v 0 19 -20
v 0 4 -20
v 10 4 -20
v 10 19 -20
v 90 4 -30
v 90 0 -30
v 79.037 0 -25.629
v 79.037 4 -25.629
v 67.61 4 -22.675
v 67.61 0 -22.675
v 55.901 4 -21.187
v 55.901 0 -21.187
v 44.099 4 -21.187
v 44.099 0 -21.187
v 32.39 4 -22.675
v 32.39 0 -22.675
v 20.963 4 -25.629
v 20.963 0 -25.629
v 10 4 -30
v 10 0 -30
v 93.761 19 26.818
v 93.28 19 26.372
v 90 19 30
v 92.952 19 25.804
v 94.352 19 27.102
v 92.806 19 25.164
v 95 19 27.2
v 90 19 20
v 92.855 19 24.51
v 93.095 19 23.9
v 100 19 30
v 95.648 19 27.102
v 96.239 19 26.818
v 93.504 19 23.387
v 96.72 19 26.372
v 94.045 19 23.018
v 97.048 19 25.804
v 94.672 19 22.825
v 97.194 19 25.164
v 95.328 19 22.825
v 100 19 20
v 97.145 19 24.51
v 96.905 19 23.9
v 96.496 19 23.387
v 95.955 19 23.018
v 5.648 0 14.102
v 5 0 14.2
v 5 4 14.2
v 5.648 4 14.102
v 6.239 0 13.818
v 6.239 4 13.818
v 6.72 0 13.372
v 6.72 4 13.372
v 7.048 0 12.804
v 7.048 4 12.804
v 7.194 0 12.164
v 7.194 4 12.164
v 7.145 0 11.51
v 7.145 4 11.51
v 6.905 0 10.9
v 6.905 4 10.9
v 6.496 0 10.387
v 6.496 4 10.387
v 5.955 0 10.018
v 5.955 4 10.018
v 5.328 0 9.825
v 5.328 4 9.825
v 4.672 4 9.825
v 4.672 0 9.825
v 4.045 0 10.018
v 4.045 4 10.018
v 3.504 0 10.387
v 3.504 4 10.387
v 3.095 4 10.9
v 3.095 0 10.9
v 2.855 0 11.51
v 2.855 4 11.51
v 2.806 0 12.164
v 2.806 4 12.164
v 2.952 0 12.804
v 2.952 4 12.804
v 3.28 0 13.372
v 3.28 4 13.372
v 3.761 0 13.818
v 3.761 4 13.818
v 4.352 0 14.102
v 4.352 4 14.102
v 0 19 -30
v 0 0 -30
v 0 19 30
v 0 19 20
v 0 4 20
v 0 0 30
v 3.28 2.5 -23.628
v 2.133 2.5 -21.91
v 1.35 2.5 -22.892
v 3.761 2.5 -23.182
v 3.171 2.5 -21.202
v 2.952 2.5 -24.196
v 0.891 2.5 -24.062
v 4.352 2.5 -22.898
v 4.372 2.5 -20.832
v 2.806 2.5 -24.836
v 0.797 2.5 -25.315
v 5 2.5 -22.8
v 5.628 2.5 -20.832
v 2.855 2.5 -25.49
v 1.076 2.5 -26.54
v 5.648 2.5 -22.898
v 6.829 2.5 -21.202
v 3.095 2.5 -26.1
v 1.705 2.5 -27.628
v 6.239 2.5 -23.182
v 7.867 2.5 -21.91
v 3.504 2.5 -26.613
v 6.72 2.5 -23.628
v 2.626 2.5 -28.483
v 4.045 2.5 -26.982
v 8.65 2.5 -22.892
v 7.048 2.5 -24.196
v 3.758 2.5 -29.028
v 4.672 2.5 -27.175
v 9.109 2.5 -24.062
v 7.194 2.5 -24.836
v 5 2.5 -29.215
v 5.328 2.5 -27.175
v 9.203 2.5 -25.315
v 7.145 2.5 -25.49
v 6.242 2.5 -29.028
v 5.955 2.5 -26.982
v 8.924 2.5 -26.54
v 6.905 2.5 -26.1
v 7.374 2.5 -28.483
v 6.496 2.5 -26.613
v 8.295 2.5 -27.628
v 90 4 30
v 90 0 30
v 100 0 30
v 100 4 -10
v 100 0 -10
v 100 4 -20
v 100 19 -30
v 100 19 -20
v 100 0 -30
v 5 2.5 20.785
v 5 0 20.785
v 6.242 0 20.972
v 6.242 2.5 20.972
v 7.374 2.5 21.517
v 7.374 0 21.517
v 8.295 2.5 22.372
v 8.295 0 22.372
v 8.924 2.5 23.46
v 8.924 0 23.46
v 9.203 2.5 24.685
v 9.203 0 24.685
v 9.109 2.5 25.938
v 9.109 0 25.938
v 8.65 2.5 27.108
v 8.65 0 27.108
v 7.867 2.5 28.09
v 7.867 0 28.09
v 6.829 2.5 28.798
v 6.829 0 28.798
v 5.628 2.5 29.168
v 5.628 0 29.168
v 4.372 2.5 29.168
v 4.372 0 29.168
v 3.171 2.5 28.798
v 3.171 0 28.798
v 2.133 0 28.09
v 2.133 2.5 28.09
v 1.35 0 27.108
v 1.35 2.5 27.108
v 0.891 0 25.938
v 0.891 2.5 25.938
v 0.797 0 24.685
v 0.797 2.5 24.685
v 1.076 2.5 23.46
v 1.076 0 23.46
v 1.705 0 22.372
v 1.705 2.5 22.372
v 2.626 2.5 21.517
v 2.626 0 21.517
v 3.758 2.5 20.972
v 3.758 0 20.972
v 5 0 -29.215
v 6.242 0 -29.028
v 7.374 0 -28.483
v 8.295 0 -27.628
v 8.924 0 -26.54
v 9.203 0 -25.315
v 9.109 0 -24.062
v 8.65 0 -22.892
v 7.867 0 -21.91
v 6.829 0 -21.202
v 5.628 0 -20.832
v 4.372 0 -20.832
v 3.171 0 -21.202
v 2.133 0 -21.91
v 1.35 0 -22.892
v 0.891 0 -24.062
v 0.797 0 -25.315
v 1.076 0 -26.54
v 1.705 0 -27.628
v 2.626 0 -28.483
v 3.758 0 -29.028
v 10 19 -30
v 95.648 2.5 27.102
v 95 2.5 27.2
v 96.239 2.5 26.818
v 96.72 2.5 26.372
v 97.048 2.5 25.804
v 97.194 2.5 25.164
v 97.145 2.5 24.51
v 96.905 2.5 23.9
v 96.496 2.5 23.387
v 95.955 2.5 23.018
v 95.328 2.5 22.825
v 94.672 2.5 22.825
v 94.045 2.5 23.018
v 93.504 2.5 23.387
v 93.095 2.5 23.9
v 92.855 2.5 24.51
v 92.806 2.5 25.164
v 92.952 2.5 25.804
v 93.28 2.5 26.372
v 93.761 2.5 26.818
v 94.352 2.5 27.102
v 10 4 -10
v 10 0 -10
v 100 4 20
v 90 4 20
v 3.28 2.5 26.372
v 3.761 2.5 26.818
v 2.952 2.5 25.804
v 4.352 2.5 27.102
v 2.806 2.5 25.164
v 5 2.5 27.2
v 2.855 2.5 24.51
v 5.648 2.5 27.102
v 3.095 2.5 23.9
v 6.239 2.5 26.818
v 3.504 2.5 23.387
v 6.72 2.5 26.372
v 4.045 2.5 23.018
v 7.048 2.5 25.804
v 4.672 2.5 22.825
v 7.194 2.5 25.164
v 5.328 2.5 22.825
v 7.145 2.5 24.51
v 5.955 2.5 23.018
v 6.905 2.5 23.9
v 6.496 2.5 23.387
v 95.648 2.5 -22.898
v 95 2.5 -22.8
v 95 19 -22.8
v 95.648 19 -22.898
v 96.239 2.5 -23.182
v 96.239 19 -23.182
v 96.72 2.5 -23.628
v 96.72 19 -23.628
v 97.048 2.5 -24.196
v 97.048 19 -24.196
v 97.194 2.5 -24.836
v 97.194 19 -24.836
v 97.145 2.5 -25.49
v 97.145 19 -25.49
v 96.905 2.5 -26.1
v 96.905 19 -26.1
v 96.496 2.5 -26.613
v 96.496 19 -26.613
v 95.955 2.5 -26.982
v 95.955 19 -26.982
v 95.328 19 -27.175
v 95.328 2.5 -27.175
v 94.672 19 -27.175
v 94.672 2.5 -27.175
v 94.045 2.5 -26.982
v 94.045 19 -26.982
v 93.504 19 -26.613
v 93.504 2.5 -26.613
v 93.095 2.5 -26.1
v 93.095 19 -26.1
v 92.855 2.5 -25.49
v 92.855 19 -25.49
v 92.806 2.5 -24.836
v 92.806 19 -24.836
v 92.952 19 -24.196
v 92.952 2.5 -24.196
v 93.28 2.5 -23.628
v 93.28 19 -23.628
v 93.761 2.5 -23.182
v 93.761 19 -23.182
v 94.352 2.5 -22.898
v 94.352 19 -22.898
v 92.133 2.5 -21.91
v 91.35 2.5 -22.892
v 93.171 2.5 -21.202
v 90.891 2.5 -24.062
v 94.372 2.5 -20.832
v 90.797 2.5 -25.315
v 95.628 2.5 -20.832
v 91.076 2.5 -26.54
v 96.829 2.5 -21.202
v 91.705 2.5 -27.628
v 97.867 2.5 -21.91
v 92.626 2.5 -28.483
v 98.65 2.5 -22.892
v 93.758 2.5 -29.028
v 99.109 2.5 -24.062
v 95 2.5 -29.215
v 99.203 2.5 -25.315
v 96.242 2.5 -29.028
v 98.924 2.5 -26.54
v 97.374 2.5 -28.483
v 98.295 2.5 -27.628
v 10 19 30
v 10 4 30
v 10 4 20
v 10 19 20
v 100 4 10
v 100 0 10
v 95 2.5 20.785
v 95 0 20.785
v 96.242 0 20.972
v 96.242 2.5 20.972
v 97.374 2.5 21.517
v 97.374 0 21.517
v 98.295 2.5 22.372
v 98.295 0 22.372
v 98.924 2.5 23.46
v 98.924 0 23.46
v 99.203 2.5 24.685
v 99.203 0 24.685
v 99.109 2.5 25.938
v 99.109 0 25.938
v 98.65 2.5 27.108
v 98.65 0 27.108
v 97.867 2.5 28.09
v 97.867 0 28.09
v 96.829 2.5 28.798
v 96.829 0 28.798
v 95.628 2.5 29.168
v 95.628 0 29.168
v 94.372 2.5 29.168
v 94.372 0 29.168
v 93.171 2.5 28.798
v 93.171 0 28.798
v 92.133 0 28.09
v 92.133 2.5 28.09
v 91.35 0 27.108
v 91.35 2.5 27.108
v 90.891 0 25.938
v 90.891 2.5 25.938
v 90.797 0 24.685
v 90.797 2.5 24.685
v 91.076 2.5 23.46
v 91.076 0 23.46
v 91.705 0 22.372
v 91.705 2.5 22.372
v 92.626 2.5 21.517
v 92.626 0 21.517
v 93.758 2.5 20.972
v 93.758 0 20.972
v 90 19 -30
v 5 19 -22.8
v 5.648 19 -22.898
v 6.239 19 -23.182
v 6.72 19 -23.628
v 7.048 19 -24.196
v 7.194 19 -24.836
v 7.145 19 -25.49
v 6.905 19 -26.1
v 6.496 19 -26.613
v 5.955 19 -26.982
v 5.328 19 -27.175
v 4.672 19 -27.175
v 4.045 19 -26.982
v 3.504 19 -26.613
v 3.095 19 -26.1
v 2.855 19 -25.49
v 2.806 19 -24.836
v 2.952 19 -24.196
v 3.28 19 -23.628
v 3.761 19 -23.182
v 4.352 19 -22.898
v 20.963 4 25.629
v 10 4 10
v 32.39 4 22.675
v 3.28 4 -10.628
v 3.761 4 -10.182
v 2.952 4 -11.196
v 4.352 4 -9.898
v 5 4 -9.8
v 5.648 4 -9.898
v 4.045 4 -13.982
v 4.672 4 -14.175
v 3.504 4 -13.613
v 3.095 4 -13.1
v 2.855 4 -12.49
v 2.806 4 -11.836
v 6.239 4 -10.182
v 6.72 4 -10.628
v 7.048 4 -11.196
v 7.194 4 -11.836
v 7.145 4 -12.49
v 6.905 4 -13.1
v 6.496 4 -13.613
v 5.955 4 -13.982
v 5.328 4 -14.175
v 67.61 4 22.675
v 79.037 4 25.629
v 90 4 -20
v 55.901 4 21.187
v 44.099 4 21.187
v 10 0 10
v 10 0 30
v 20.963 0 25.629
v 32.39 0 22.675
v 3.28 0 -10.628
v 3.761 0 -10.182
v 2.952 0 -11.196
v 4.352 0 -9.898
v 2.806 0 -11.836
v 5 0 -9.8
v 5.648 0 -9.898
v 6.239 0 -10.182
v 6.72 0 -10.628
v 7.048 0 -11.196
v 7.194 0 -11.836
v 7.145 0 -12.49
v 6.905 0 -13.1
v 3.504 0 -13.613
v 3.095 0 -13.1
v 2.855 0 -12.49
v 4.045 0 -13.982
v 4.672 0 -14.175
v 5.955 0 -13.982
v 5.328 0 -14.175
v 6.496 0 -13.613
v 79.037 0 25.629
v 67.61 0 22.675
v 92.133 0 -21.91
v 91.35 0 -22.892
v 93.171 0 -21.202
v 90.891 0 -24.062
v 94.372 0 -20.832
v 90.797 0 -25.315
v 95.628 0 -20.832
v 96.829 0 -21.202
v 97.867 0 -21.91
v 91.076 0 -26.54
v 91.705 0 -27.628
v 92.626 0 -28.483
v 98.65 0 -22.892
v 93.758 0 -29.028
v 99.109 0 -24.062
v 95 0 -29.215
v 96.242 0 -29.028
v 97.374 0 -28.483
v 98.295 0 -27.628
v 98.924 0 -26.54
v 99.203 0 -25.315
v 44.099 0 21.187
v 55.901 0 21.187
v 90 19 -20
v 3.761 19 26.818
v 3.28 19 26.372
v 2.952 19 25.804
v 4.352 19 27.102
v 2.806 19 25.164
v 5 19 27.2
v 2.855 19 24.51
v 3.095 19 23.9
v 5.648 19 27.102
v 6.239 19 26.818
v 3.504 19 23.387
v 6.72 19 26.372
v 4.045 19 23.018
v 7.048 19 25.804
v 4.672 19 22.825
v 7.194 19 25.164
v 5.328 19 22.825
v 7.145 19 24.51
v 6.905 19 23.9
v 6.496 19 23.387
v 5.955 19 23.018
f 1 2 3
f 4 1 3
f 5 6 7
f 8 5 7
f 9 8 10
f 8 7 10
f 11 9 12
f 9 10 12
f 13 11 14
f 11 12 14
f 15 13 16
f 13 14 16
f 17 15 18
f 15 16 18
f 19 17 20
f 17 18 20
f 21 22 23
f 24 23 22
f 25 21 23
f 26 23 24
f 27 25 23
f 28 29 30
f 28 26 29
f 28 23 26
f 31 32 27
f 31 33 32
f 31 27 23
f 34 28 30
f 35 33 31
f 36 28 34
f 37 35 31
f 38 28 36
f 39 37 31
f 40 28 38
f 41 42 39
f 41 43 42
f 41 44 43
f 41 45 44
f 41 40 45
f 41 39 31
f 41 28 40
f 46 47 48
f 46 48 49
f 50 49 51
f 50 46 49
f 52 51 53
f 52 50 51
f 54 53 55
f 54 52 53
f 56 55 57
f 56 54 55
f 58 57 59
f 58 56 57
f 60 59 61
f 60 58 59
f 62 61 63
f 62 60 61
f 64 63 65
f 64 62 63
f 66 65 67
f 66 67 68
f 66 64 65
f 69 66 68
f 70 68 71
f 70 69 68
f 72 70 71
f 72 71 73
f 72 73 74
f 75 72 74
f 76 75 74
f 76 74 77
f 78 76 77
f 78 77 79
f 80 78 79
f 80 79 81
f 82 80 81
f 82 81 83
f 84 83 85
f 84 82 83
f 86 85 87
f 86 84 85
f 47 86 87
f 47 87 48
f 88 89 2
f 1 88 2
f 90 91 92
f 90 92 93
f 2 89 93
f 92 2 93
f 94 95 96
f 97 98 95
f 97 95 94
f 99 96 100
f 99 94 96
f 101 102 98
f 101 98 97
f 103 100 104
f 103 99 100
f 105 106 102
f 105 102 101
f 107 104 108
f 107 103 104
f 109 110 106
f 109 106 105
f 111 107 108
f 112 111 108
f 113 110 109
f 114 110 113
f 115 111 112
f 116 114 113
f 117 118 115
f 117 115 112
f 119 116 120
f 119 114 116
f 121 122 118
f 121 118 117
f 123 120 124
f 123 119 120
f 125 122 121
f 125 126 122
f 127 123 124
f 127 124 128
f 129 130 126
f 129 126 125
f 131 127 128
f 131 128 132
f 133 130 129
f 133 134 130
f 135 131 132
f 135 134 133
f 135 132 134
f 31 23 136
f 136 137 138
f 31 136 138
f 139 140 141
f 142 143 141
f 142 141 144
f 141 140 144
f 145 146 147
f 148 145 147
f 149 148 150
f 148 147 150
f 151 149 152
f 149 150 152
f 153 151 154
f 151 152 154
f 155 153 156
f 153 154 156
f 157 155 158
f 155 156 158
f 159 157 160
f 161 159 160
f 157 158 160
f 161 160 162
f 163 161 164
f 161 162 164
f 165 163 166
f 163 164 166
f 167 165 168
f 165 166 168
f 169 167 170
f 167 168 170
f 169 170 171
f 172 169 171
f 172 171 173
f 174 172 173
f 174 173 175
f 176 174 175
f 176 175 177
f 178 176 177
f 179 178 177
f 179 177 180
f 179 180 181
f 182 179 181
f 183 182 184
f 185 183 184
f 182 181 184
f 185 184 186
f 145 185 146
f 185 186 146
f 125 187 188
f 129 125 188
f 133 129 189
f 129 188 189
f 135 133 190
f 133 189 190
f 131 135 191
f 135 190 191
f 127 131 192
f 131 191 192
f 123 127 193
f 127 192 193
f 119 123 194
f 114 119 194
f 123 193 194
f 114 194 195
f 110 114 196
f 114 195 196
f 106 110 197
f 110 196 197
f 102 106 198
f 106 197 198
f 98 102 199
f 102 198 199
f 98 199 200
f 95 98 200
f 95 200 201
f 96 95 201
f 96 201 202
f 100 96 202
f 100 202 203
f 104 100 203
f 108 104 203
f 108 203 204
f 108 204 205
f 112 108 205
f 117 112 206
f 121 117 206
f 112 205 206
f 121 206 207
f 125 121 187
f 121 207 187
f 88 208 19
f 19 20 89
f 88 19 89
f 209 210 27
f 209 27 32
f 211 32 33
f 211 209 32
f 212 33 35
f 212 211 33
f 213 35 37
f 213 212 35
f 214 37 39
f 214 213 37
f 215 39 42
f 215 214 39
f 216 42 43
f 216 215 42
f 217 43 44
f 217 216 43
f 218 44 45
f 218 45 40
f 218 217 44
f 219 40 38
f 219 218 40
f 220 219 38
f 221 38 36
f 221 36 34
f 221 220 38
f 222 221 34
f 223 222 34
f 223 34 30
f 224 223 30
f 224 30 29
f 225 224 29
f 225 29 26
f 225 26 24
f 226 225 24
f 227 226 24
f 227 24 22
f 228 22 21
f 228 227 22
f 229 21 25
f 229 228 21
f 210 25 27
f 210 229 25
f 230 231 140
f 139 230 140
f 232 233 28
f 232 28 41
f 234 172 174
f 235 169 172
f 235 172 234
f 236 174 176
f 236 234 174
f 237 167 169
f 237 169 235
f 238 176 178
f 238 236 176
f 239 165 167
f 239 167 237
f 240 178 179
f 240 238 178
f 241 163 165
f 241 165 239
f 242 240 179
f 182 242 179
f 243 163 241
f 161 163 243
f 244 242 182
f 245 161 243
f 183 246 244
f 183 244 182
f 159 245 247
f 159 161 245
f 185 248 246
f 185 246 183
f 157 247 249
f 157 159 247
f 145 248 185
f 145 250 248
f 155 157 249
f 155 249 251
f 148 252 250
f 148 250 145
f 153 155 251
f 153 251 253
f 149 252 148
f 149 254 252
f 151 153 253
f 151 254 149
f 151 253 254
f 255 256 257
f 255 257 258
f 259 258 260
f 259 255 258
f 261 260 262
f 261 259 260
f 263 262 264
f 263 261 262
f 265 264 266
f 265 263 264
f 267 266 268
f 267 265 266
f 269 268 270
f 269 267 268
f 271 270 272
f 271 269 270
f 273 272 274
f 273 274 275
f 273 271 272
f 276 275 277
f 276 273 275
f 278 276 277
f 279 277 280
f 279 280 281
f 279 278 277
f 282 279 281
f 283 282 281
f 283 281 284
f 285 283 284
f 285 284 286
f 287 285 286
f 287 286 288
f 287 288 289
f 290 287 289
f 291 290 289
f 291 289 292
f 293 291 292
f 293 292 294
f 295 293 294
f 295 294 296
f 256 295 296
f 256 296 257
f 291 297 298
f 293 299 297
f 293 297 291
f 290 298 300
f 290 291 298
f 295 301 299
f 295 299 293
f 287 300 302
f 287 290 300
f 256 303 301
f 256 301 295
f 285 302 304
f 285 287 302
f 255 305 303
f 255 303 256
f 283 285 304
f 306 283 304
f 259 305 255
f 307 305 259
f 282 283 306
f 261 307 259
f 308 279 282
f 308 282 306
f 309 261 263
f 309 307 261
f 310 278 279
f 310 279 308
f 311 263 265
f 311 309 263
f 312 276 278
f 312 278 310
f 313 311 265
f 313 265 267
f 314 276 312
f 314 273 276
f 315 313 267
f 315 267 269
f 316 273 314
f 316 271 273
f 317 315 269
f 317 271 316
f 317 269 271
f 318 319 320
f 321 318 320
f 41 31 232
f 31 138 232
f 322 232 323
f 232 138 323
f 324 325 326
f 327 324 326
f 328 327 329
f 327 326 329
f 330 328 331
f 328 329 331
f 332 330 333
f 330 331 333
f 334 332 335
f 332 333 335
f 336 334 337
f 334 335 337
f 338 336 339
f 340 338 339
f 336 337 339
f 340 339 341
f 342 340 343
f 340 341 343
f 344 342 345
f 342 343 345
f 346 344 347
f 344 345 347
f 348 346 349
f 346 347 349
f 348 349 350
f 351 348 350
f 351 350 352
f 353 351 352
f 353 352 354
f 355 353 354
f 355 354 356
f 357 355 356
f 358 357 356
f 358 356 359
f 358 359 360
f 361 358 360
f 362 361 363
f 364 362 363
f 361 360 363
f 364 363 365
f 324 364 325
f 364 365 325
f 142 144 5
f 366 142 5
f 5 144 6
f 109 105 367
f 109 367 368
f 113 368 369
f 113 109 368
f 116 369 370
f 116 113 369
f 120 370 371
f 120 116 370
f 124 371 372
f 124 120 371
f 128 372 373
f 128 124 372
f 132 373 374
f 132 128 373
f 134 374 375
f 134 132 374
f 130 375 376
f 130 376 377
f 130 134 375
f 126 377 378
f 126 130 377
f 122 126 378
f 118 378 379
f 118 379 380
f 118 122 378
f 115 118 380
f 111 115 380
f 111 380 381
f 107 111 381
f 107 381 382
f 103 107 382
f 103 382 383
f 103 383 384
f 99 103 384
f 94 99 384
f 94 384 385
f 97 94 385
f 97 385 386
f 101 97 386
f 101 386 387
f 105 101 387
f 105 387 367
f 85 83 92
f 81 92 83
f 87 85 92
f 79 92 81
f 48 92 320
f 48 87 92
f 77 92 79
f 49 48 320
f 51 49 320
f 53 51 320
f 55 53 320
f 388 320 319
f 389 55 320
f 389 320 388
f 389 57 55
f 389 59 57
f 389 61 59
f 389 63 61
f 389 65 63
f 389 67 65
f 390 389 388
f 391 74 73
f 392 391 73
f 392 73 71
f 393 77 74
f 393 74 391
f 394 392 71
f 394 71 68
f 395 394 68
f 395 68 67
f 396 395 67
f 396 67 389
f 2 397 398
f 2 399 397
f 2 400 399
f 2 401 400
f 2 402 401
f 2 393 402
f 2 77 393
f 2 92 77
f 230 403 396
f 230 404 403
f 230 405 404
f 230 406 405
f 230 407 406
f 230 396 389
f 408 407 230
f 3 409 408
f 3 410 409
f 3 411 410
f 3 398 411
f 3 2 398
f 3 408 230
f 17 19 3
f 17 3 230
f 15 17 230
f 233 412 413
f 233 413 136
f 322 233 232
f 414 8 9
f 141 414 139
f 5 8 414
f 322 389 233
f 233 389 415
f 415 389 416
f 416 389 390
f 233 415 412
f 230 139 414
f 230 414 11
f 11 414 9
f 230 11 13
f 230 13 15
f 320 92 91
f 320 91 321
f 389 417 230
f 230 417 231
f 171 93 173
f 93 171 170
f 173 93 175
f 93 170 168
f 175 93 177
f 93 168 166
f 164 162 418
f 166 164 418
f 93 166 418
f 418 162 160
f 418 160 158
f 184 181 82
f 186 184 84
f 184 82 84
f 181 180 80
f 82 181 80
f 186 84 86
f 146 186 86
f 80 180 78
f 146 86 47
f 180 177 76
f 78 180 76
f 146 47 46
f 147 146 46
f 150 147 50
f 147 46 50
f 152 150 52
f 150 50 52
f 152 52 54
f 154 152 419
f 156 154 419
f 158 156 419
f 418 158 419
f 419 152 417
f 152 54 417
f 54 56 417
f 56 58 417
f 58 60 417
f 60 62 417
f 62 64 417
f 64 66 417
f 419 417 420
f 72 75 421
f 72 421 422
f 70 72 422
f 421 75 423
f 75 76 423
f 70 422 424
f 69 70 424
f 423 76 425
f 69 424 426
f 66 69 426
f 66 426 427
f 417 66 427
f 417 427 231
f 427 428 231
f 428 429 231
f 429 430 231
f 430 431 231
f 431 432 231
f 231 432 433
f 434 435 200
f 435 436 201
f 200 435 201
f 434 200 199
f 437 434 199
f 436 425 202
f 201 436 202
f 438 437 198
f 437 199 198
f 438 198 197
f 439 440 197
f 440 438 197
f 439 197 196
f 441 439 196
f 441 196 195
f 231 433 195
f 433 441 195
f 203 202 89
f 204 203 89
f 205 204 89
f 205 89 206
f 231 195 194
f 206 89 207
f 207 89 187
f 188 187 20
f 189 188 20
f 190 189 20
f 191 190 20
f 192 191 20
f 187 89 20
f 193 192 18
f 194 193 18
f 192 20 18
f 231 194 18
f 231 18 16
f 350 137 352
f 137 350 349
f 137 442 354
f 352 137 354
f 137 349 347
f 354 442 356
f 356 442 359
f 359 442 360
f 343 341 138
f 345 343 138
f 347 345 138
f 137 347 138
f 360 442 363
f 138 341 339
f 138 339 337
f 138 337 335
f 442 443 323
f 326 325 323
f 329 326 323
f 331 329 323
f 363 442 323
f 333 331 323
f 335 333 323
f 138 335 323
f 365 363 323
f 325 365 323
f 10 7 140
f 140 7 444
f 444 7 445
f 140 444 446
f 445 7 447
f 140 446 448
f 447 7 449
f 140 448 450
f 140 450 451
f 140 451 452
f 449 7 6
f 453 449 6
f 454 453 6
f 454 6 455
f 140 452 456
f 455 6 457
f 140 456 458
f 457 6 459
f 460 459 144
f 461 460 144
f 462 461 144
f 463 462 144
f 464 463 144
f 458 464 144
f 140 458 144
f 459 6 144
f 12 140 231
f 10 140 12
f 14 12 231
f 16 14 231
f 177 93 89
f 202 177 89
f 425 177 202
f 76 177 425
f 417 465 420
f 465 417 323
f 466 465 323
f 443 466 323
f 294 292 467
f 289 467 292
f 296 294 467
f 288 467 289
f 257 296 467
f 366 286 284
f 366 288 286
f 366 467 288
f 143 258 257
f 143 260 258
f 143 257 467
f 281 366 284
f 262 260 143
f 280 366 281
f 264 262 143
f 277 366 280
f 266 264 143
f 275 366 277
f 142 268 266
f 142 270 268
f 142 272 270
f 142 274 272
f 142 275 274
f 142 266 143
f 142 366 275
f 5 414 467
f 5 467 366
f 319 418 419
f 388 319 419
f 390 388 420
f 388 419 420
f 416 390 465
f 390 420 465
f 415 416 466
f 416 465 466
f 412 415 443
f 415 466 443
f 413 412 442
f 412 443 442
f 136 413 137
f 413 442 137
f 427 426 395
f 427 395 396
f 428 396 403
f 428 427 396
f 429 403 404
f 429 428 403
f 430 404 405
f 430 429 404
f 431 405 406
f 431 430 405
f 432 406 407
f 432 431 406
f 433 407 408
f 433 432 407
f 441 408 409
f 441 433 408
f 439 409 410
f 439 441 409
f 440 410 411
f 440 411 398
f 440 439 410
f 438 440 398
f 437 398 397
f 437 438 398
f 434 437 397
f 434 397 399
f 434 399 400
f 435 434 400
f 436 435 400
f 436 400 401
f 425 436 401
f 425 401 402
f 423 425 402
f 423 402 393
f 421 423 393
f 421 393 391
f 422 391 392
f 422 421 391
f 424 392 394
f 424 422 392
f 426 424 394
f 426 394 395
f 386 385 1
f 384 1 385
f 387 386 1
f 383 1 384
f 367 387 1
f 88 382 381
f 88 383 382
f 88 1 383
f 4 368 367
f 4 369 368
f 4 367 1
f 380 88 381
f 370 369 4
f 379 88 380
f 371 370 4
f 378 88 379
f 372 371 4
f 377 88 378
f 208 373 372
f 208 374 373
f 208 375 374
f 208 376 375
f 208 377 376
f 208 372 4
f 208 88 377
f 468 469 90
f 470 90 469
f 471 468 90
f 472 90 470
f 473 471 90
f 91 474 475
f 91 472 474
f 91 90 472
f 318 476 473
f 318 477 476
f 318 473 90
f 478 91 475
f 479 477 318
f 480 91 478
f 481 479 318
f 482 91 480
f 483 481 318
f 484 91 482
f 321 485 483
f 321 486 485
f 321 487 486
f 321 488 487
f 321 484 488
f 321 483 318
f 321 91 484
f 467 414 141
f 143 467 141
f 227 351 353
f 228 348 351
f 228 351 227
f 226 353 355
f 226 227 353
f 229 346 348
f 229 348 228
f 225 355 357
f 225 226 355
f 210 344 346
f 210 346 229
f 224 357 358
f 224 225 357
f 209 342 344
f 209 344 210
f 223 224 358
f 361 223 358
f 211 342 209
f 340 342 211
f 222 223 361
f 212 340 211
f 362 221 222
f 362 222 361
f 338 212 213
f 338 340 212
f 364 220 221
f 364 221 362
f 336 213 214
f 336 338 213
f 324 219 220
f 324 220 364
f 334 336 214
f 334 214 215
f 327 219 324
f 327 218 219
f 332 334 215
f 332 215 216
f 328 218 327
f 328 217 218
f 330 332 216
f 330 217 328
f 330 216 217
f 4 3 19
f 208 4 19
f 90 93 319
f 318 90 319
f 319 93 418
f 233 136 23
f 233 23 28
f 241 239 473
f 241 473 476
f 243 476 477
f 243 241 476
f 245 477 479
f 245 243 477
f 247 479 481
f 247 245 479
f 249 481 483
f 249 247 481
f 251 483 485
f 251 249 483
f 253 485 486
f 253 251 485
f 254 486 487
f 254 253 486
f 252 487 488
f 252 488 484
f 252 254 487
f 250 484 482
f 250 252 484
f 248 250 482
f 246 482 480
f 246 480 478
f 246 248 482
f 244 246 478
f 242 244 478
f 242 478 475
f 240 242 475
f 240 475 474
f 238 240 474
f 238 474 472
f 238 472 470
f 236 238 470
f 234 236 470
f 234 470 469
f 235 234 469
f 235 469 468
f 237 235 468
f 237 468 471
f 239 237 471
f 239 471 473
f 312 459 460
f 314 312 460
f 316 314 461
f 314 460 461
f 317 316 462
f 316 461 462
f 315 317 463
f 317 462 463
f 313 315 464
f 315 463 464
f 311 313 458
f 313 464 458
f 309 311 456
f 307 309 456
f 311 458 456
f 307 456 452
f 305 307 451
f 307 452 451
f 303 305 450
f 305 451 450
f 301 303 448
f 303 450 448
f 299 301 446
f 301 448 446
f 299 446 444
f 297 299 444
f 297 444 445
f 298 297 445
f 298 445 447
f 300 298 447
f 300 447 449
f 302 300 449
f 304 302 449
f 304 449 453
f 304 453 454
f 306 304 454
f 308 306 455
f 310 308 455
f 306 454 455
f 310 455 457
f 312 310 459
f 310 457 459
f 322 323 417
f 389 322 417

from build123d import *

# Parameters (mm, degrees)
SKETCH1_R                  = 2.2
EXTRUDE_BODY_DEPTH         = 4
SKETCH5_W                  = 10
SKETCH5_H                  = 10
SKETCH5_R                  = 2.2
EXTRUDE_LEGS_DEPTH         = 15
SKETCH6_R                  = 4.215
CUT_BOLT_HEAD_INSETS_DEPTH = 2.5


with BuildPart() as part:
    # Sketch1 → Extrude-Body (new body)
    with BuildSketch(Plane(origin=(0, 0, 0), x_dir=(1, 0, 0), z_dir=(0, 1, 0))):
        with BuildLine():
            Line((10, -10), (10, 10))
            Line((10, 10), (100, 10))
            Line((100, 10), (100, 30))
            Line((100, 30), (90, 30))
            ThreePointArc((90, 30), (50, 21), (10, 30))
            Line((10, 30), (0, 30))
            Line((0, 30), (0, -30))
            Line((0, -30), (10, -30))
            ThreePointArc((10, -30), (50, -21), (90, -30))
            Line((90, -30), (100, -30))
            Line((100, -30), (100, -10))
            Line((100, -10), (10, -10))
        make_face()
        with Locations(Location((5, -12, 0), (0, 0, 270))):
            Circle(SKETCH1_R, mode=Mode.SUBTRACT)
        with Locations(Location((5, 12, 0), (0, 0, 270))):
            Circle(SKETCH1_R, mode=Mode.SUBTRACT)
        with Locations(Location((95, 25, 0), (0, 0, 270))):
            Circle(SKETCH1_R, mode=Mode.SUBTRACT)
        with Locations(Location((95, -25, 0), (0, 0, 270))):
            Circle(SKETCH1_R, mode=Mode.SUBTRACT)
        with Locations(Location((5, 25, 0), (0, 0, 270))):
            Circle(SKETCH1_R, mode=Mode.SUBTRACT)
        with Locations(Location((5, -25, 0), (0, 0, 270))):
            Circle(SKETCH1_R, mode=Mode.SUBTRACT)
    extrude(amount=EXTRUDE_BODY_DEPTH)

    # Sketch5 → Extrude-Legs (add)
    # profile 1 of 4: a face of its own
    with BuildSketch(Plane(origin=(0, 4, 0), x_dir=(1, 0, 0), z_dir=(0, 1, 0))):
        with Locations((95, -25)):
            Rectangle(SKETCH5_W, SKETCH5_H)
        with Locations(Location((95, -25, 0), (0, 0, 270))):
            Circle(SKETCH5_R, mode=Mode.SUBTRACT)
    # profile 2 of 4: a face of its own
    with BuildSketch(Plane(origin=(0, 4, 0), x_dir=(1, 0, 0), z_dir=(0, 1, 0))):
        with Locations((95, 25)):
            Rectangle(SKETCH5_W, SKETCH5_H)
        with Locations(Location((95, 25, 0), (0, 0, 270))):
            Circle(SKETCH5_R, mode=Mode.SUBTRACT)
    # profile 3 of 4: a face of its own
    with BuildSketch(Plane(origin=(0, 4, 0), x_dir=(1, 0, 0), z_dir=(0, 1, 0))):
        with Locations((5, 25)):
            Rectangle(SKETCH5_W, SKETCH5_H)
        with Locations(Location((5, 25, 0), (0, 0, 270))):
            Circle(SKETCH5_R, mode=Mode.SUBTRACT)
    # profile 4 of 4: a face of its own
    with BuildSketch(Plane(origin=(0, 4, 0), x_dir=(1, 0, 0), z_dir=(0, 1, 0))):
        with Locations((5, -25)):
            Rectangle(SKETCH5_W, SKETCH5_H)
        with Locations(Location((5, -25, 0), (0, 0, 270))):
            Circle(SKETCH5_R, mode=Mode.SUBTRACT)
    extrude(amount=EXTRUDE_LEGS_DEPTH)

    # Sketch6 → Cut-Bolt Head Insets (cut)
    with BuildSketch(Plane.XZ):
        with Locations(Location((5, -25, 0), (0, 0, 270))):
            Circle(SKETCH6_R)
        with Locations(Location((5, 25, 0), (0, 0, 270))):
            Circle(SKETCH6_R)
        with Locations(Location((95, 25, 0), (0, 0, 270))):
            Circle(SKETCH6_R)
        with Locations(Location((95, -25, 0), (0, 0, 270))):
            Circle(SKETCH6_R)
    extrude(amount=-CUT_BOLT_HEAD_INSETS_DEPTH, mode=Mode.SUBTRACT)


solid = part.part
